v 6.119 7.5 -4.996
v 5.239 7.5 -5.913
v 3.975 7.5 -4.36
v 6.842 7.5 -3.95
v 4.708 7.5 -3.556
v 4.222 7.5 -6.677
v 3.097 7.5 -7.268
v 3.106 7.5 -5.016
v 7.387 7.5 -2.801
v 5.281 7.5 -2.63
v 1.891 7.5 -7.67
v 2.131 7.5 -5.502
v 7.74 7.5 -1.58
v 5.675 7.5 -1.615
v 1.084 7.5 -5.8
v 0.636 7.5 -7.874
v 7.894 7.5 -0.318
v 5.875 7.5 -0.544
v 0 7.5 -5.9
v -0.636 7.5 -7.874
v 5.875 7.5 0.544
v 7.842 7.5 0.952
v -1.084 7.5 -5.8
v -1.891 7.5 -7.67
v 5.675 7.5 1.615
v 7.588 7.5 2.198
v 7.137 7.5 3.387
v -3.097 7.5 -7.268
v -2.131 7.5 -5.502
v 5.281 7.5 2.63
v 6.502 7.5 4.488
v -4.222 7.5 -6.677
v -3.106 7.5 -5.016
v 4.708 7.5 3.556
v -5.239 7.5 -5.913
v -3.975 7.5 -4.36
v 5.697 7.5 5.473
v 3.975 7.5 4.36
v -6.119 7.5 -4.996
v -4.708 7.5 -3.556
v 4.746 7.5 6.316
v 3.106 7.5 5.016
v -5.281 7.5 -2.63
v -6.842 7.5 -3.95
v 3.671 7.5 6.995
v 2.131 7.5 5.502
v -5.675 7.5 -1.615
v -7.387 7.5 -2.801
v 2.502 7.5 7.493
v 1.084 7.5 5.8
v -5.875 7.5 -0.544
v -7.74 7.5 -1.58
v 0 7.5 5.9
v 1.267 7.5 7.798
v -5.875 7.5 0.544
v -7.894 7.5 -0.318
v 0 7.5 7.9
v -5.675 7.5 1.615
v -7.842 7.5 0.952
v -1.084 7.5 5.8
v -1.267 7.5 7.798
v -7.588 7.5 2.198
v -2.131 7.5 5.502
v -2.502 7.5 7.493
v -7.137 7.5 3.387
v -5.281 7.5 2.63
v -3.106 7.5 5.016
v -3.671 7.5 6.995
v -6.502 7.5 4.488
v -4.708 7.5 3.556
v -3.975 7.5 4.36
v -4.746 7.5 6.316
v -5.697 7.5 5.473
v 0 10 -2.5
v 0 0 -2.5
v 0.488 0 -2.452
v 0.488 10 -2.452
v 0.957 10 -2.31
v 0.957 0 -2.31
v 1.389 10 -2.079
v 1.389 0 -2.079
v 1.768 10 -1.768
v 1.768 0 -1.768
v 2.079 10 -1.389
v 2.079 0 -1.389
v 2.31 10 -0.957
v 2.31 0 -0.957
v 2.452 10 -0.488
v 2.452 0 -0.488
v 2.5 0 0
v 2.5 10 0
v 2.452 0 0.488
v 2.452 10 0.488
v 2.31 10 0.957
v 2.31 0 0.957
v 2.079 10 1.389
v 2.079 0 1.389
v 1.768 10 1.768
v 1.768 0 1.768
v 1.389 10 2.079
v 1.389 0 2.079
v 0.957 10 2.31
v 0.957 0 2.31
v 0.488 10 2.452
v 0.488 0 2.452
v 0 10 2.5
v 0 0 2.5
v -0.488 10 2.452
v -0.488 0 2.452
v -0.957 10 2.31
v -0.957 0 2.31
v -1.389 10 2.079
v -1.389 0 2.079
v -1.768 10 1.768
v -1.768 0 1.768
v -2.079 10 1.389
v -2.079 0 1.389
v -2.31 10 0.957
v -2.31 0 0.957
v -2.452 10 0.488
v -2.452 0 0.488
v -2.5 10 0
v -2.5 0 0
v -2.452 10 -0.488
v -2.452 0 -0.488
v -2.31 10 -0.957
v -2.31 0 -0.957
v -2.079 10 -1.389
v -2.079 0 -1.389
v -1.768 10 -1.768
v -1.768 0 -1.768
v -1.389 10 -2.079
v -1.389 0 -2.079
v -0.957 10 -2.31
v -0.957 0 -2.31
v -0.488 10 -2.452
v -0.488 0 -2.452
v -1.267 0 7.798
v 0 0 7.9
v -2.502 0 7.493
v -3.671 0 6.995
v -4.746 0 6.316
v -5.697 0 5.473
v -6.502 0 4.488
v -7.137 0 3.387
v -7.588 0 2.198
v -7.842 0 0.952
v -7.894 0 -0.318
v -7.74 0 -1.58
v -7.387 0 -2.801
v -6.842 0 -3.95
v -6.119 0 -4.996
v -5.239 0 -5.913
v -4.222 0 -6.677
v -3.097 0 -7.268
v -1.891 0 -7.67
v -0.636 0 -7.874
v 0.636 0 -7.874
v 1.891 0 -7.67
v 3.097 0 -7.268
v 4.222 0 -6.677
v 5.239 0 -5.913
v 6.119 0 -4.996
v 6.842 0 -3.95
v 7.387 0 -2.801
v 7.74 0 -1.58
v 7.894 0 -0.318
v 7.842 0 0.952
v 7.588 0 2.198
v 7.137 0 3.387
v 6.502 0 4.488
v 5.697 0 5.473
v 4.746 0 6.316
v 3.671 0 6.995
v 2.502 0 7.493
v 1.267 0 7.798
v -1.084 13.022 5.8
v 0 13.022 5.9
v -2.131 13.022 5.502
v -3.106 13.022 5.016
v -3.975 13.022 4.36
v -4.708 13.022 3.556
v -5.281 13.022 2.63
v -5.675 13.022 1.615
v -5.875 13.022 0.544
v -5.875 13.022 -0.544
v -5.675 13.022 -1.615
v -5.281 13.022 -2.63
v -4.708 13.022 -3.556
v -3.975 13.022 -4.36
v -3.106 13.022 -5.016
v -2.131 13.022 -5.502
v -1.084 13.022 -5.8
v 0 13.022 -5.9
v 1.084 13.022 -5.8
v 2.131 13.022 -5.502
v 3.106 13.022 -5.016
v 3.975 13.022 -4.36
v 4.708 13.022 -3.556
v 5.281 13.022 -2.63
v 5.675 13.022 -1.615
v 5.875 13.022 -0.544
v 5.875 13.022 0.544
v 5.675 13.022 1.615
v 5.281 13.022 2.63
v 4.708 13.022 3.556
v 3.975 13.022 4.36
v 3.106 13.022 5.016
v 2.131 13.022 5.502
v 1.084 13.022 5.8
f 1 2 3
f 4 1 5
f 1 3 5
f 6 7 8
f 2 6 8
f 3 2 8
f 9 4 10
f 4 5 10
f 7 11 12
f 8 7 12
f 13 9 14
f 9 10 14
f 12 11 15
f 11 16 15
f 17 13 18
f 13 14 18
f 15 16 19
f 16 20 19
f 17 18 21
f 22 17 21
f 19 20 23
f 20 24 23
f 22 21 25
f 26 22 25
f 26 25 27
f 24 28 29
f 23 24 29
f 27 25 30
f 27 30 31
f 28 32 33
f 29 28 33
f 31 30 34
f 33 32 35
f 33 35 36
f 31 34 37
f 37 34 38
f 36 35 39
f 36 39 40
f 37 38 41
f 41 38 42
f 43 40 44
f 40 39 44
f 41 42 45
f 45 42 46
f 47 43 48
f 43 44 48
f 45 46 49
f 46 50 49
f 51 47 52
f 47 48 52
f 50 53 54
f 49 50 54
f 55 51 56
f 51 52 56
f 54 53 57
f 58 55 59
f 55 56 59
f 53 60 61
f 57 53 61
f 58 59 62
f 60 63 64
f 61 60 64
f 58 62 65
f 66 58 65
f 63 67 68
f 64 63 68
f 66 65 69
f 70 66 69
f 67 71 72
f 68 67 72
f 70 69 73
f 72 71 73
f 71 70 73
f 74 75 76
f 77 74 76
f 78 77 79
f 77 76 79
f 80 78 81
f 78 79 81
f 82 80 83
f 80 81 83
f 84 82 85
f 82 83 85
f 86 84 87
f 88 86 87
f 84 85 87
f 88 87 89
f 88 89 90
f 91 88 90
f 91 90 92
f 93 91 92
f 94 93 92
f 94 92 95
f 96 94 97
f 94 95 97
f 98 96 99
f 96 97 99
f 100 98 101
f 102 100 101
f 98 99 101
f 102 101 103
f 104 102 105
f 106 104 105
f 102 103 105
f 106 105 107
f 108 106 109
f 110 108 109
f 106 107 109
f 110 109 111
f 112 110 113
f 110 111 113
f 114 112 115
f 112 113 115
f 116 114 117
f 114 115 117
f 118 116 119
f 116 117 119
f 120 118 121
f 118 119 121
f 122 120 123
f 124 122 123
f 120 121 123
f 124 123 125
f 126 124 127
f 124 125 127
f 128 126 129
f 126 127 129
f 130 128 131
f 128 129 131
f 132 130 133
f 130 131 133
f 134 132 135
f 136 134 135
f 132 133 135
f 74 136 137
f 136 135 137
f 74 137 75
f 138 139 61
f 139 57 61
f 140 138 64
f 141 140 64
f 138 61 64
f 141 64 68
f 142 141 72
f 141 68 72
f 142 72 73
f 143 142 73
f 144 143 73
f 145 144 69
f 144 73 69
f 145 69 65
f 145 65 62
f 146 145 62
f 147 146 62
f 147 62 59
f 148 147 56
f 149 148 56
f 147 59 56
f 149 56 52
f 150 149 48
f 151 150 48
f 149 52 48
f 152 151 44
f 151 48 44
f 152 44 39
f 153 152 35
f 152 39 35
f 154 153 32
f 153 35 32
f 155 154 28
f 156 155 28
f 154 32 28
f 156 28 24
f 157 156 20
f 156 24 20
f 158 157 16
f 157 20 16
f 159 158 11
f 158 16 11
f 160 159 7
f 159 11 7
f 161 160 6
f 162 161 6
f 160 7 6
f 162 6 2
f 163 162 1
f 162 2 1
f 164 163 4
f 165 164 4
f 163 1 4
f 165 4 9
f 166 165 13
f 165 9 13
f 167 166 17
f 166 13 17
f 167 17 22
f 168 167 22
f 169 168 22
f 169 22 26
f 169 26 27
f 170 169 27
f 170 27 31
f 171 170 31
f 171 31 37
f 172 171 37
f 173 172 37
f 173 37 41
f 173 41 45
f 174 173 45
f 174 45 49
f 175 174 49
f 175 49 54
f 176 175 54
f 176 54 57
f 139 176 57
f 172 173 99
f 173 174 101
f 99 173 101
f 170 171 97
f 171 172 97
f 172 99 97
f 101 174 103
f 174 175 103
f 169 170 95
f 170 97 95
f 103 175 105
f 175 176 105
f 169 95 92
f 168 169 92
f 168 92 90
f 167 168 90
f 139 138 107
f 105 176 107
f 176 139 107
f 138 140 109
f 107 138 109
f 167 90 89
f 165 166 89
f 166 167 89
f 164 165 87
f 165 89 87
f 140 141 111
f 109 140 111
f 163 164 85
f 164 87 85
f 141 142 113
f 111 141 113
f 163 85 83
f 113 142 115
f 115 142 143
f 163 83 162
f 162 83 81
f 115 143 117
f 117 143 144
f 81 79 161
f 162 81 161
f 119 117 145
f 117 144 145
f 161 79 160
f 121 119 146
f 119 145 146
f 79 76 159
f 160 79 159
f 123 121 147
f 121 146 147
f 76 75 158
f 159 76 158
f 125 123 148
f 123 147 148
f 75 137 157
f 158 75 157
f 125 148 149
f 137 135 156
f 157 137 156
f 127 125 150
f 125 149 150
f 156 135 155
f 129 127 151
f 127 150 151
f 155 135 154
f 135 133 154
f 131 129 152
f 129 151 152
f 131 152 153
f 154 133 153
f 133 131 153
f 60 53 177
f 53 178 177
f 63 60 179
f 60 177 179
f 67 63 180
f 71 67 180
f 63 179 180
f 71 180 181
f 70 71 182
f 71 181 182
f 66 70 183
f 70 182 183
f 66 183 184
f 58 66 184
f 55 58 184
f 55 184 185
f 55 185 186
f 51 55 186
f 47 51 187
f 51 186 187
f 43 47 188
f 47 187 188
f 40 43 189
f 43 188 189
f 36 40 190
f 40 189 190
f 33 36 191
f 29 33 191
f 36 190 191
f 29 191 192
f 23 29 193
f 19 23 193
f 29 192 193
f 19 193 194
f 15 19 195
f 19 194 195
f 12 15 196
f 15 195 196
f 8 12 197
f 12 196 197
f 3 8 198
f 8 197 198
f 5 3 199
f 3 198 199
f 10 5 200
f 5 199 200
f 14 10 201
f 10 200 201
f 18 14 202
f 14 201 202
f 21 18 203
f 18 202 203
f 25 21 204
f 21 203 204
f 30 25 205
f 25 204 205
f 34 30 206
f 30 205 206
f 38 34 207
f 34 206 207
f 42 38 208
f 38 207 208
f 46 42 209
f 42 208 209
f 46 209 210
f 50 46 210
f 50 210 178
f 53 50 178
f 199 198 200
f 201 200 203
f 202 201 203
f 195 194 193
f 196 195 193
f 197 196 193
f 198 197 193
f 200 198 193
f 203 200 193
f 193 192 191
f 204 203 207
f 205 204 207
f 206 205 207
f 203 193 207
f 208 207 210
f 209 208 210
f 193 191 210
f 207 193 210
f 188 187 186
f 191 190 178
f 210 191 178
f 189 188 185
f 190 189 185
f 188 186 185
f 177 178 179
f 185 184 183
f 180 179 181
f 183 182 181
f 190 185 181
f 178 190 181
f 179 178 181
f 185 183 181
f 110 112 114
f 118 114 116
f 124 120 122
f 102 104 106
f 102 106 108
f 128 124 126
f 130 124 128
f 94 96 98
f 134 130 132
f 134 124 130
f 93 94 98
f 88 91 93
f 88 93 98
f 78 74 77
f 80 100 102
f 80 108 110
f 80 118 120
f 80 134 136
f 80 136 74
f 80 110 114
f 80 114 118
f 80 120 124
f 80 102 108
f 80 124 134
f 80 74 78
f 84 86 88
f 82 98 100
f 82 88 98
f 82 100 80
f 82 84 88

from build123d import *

# Parameters (mm, degrees)
SKETCH2_R          = 2.5
CUT_EXTRUDE1_DEPTH = 10


with BuildPart() as part:
    # Sketch1 → Revolve1 (revolve)
    with BuildSketch(Plane.XY, mode=Mode.PRIVATE) as revolve1_sk:
        Polygon((0, 0), (7.9, 0), (7.9, 7.5), (5.9, 7.5), (5.9, 13.022374429), (0, 13.022374429), align=None)
    revolve(revolve1_sk.sketch.rotate(Axis((0, 13.022374429, 0), (0, -1, 0)), 90), axis=Axis((0, 13.022374429, 0), (0, -1, 0)))

    # Sketch2 → Cut-Extrude1 (cut)
    with BuildSketch(Plane.XZ):
        with Locations(Location((0, 0, 0), (0, 0, 270))):
            Circle(SKETCH2_R)
    extrude(amount=-CUT_EXTRUDE1_DEPTH, mode=Mode.SUBTRACT)


solid = part.part
